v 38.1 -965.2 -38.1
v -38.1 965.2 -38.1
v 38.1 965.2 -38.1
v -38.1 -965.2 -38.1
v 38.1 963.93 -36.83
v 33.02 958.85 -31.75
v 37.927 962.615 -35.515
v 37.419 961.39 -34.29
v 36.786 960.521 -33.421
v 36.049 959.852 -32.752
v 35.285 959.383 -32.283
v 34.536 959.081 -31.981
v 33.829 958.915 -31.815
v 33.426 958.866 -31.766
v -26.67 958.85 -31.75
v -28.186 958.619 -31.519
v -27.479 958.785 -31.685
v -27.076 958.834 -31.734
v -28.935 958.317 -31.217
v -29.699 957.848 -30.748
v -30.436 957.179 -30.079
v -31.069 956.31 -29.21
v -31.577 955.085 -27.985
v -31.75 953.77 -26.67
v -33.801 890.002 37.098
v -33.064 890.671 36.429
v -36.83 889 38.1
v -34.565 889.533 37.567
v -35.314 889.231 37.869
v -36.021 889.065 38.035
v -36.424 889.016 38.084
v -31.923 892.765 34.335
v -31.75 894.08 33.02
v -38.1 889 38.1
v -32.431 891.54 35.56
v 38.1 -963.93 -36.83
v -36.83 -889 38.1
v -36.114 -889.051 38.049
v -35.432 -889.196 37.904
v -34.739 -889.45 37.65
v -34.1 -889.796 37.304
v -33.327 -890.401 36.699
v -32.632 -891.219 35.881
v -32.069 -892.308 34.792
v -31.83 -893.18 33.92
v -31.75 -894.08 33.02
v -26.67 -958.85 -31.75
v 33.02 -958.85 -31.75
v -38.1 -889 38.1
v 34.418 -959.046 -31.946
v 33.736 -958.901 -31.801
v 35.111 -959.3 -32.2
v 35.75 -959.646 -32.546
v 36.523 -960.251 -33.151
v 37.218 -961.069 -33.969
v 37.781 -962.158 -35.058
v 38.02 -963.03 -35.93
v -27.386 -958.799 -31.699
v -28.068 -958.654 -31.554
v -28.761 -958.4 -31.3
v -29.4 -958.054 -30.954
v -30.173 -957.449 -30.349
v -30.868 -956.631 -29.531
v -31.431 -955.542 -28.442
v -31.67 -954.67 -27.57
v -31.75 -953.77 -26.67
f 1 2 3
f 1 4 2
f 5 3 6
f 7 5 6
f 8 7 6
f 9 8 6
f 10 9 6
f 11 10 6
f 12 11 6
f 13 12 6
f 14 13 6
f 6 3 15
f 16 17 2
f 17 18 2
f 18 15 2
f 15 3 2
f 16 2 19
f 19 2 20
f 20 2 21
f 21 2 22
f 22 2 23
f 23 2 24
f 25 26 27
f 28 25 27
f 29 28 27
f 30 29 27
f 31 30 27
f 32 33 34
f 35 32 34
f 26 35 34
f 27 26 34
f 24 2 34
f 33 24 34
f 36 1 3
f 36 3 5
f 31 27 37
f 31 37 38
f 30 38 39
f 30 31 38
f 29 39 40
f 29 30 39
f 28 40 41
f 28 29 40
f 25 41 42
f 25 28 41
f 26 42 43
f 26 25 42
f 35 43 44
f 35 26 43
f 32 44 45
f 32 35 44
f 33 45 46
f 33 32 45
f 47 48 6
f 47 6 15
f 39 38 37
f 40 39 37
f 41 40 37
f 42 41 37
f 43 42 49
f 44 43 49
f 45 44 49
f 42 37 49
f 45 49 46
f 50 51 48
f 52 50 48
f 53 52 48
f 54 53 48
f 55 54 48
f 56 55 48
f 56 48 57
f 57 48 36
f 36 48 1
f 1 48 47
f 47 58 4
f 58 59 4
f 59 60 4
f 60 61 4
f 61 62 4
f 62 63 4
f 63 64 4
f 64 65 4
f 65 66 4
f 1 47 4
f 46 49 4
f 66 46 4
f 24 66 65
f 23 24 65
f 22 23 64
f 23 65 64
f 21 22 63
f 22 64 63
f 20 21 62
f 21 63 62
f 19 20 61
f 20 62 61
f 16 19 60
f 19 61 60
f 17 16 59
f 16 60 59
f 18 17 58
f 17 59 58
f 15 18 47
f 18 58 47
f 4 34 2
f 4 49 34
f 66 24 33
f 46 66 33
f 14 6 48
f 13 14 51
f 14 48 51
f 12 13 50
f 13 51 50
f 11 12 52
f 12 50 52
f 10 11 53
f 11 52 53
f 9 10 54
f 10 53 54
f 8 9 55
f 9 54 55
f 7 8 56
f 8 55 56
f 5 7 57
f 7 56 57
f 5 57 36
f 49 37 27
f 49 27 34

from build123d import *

# Parameters (mm, degrees)
F1_DEPTH = 965.2
F2_R     = 5.08
F4_DEPTH = 76.2


with BuildPart() as f1:
    # F0 (on Front) → F1 (new body, symmetric)
    with BuildSketch(Plane.XZ):
        Polygon((-38.1, -38.1), (38.1, -38.1), (38.1, -31.75), (-31.75, -31.75), (-31.75, 38.1), (-38.1, 38.1), align=None)
    extrude(amount=F1_DEPTH, both=True)

    # F2
    f2_edges = [f1.edges().sort_by_distance(p)[0] for p in [
        (-31.75, 0, 38.1),
        (-31.75, 0, -31.75),
        (38.1, 0, -31.75),
    ]]
    fillet(f2_edges, radius=F2_R)

    # F3 (on face) → F4 (cut)
    with BuildSketch(Plane(origin=(-38.1, 0, 0), x_dir=(0, -1, 0), z_dir=(-1, 0, 0))):
        Polygon((-965.2, 38.1), (-965.2, -38.1), (-889, 38.1), align=None)
        Polygon((889, 38.1), (965.2, -38.1), (965.2, 38.1), align=None)
    extrude(amount=-F4_DEPTH, mode=Mode.SUBTRACT)


solid = f1.part
